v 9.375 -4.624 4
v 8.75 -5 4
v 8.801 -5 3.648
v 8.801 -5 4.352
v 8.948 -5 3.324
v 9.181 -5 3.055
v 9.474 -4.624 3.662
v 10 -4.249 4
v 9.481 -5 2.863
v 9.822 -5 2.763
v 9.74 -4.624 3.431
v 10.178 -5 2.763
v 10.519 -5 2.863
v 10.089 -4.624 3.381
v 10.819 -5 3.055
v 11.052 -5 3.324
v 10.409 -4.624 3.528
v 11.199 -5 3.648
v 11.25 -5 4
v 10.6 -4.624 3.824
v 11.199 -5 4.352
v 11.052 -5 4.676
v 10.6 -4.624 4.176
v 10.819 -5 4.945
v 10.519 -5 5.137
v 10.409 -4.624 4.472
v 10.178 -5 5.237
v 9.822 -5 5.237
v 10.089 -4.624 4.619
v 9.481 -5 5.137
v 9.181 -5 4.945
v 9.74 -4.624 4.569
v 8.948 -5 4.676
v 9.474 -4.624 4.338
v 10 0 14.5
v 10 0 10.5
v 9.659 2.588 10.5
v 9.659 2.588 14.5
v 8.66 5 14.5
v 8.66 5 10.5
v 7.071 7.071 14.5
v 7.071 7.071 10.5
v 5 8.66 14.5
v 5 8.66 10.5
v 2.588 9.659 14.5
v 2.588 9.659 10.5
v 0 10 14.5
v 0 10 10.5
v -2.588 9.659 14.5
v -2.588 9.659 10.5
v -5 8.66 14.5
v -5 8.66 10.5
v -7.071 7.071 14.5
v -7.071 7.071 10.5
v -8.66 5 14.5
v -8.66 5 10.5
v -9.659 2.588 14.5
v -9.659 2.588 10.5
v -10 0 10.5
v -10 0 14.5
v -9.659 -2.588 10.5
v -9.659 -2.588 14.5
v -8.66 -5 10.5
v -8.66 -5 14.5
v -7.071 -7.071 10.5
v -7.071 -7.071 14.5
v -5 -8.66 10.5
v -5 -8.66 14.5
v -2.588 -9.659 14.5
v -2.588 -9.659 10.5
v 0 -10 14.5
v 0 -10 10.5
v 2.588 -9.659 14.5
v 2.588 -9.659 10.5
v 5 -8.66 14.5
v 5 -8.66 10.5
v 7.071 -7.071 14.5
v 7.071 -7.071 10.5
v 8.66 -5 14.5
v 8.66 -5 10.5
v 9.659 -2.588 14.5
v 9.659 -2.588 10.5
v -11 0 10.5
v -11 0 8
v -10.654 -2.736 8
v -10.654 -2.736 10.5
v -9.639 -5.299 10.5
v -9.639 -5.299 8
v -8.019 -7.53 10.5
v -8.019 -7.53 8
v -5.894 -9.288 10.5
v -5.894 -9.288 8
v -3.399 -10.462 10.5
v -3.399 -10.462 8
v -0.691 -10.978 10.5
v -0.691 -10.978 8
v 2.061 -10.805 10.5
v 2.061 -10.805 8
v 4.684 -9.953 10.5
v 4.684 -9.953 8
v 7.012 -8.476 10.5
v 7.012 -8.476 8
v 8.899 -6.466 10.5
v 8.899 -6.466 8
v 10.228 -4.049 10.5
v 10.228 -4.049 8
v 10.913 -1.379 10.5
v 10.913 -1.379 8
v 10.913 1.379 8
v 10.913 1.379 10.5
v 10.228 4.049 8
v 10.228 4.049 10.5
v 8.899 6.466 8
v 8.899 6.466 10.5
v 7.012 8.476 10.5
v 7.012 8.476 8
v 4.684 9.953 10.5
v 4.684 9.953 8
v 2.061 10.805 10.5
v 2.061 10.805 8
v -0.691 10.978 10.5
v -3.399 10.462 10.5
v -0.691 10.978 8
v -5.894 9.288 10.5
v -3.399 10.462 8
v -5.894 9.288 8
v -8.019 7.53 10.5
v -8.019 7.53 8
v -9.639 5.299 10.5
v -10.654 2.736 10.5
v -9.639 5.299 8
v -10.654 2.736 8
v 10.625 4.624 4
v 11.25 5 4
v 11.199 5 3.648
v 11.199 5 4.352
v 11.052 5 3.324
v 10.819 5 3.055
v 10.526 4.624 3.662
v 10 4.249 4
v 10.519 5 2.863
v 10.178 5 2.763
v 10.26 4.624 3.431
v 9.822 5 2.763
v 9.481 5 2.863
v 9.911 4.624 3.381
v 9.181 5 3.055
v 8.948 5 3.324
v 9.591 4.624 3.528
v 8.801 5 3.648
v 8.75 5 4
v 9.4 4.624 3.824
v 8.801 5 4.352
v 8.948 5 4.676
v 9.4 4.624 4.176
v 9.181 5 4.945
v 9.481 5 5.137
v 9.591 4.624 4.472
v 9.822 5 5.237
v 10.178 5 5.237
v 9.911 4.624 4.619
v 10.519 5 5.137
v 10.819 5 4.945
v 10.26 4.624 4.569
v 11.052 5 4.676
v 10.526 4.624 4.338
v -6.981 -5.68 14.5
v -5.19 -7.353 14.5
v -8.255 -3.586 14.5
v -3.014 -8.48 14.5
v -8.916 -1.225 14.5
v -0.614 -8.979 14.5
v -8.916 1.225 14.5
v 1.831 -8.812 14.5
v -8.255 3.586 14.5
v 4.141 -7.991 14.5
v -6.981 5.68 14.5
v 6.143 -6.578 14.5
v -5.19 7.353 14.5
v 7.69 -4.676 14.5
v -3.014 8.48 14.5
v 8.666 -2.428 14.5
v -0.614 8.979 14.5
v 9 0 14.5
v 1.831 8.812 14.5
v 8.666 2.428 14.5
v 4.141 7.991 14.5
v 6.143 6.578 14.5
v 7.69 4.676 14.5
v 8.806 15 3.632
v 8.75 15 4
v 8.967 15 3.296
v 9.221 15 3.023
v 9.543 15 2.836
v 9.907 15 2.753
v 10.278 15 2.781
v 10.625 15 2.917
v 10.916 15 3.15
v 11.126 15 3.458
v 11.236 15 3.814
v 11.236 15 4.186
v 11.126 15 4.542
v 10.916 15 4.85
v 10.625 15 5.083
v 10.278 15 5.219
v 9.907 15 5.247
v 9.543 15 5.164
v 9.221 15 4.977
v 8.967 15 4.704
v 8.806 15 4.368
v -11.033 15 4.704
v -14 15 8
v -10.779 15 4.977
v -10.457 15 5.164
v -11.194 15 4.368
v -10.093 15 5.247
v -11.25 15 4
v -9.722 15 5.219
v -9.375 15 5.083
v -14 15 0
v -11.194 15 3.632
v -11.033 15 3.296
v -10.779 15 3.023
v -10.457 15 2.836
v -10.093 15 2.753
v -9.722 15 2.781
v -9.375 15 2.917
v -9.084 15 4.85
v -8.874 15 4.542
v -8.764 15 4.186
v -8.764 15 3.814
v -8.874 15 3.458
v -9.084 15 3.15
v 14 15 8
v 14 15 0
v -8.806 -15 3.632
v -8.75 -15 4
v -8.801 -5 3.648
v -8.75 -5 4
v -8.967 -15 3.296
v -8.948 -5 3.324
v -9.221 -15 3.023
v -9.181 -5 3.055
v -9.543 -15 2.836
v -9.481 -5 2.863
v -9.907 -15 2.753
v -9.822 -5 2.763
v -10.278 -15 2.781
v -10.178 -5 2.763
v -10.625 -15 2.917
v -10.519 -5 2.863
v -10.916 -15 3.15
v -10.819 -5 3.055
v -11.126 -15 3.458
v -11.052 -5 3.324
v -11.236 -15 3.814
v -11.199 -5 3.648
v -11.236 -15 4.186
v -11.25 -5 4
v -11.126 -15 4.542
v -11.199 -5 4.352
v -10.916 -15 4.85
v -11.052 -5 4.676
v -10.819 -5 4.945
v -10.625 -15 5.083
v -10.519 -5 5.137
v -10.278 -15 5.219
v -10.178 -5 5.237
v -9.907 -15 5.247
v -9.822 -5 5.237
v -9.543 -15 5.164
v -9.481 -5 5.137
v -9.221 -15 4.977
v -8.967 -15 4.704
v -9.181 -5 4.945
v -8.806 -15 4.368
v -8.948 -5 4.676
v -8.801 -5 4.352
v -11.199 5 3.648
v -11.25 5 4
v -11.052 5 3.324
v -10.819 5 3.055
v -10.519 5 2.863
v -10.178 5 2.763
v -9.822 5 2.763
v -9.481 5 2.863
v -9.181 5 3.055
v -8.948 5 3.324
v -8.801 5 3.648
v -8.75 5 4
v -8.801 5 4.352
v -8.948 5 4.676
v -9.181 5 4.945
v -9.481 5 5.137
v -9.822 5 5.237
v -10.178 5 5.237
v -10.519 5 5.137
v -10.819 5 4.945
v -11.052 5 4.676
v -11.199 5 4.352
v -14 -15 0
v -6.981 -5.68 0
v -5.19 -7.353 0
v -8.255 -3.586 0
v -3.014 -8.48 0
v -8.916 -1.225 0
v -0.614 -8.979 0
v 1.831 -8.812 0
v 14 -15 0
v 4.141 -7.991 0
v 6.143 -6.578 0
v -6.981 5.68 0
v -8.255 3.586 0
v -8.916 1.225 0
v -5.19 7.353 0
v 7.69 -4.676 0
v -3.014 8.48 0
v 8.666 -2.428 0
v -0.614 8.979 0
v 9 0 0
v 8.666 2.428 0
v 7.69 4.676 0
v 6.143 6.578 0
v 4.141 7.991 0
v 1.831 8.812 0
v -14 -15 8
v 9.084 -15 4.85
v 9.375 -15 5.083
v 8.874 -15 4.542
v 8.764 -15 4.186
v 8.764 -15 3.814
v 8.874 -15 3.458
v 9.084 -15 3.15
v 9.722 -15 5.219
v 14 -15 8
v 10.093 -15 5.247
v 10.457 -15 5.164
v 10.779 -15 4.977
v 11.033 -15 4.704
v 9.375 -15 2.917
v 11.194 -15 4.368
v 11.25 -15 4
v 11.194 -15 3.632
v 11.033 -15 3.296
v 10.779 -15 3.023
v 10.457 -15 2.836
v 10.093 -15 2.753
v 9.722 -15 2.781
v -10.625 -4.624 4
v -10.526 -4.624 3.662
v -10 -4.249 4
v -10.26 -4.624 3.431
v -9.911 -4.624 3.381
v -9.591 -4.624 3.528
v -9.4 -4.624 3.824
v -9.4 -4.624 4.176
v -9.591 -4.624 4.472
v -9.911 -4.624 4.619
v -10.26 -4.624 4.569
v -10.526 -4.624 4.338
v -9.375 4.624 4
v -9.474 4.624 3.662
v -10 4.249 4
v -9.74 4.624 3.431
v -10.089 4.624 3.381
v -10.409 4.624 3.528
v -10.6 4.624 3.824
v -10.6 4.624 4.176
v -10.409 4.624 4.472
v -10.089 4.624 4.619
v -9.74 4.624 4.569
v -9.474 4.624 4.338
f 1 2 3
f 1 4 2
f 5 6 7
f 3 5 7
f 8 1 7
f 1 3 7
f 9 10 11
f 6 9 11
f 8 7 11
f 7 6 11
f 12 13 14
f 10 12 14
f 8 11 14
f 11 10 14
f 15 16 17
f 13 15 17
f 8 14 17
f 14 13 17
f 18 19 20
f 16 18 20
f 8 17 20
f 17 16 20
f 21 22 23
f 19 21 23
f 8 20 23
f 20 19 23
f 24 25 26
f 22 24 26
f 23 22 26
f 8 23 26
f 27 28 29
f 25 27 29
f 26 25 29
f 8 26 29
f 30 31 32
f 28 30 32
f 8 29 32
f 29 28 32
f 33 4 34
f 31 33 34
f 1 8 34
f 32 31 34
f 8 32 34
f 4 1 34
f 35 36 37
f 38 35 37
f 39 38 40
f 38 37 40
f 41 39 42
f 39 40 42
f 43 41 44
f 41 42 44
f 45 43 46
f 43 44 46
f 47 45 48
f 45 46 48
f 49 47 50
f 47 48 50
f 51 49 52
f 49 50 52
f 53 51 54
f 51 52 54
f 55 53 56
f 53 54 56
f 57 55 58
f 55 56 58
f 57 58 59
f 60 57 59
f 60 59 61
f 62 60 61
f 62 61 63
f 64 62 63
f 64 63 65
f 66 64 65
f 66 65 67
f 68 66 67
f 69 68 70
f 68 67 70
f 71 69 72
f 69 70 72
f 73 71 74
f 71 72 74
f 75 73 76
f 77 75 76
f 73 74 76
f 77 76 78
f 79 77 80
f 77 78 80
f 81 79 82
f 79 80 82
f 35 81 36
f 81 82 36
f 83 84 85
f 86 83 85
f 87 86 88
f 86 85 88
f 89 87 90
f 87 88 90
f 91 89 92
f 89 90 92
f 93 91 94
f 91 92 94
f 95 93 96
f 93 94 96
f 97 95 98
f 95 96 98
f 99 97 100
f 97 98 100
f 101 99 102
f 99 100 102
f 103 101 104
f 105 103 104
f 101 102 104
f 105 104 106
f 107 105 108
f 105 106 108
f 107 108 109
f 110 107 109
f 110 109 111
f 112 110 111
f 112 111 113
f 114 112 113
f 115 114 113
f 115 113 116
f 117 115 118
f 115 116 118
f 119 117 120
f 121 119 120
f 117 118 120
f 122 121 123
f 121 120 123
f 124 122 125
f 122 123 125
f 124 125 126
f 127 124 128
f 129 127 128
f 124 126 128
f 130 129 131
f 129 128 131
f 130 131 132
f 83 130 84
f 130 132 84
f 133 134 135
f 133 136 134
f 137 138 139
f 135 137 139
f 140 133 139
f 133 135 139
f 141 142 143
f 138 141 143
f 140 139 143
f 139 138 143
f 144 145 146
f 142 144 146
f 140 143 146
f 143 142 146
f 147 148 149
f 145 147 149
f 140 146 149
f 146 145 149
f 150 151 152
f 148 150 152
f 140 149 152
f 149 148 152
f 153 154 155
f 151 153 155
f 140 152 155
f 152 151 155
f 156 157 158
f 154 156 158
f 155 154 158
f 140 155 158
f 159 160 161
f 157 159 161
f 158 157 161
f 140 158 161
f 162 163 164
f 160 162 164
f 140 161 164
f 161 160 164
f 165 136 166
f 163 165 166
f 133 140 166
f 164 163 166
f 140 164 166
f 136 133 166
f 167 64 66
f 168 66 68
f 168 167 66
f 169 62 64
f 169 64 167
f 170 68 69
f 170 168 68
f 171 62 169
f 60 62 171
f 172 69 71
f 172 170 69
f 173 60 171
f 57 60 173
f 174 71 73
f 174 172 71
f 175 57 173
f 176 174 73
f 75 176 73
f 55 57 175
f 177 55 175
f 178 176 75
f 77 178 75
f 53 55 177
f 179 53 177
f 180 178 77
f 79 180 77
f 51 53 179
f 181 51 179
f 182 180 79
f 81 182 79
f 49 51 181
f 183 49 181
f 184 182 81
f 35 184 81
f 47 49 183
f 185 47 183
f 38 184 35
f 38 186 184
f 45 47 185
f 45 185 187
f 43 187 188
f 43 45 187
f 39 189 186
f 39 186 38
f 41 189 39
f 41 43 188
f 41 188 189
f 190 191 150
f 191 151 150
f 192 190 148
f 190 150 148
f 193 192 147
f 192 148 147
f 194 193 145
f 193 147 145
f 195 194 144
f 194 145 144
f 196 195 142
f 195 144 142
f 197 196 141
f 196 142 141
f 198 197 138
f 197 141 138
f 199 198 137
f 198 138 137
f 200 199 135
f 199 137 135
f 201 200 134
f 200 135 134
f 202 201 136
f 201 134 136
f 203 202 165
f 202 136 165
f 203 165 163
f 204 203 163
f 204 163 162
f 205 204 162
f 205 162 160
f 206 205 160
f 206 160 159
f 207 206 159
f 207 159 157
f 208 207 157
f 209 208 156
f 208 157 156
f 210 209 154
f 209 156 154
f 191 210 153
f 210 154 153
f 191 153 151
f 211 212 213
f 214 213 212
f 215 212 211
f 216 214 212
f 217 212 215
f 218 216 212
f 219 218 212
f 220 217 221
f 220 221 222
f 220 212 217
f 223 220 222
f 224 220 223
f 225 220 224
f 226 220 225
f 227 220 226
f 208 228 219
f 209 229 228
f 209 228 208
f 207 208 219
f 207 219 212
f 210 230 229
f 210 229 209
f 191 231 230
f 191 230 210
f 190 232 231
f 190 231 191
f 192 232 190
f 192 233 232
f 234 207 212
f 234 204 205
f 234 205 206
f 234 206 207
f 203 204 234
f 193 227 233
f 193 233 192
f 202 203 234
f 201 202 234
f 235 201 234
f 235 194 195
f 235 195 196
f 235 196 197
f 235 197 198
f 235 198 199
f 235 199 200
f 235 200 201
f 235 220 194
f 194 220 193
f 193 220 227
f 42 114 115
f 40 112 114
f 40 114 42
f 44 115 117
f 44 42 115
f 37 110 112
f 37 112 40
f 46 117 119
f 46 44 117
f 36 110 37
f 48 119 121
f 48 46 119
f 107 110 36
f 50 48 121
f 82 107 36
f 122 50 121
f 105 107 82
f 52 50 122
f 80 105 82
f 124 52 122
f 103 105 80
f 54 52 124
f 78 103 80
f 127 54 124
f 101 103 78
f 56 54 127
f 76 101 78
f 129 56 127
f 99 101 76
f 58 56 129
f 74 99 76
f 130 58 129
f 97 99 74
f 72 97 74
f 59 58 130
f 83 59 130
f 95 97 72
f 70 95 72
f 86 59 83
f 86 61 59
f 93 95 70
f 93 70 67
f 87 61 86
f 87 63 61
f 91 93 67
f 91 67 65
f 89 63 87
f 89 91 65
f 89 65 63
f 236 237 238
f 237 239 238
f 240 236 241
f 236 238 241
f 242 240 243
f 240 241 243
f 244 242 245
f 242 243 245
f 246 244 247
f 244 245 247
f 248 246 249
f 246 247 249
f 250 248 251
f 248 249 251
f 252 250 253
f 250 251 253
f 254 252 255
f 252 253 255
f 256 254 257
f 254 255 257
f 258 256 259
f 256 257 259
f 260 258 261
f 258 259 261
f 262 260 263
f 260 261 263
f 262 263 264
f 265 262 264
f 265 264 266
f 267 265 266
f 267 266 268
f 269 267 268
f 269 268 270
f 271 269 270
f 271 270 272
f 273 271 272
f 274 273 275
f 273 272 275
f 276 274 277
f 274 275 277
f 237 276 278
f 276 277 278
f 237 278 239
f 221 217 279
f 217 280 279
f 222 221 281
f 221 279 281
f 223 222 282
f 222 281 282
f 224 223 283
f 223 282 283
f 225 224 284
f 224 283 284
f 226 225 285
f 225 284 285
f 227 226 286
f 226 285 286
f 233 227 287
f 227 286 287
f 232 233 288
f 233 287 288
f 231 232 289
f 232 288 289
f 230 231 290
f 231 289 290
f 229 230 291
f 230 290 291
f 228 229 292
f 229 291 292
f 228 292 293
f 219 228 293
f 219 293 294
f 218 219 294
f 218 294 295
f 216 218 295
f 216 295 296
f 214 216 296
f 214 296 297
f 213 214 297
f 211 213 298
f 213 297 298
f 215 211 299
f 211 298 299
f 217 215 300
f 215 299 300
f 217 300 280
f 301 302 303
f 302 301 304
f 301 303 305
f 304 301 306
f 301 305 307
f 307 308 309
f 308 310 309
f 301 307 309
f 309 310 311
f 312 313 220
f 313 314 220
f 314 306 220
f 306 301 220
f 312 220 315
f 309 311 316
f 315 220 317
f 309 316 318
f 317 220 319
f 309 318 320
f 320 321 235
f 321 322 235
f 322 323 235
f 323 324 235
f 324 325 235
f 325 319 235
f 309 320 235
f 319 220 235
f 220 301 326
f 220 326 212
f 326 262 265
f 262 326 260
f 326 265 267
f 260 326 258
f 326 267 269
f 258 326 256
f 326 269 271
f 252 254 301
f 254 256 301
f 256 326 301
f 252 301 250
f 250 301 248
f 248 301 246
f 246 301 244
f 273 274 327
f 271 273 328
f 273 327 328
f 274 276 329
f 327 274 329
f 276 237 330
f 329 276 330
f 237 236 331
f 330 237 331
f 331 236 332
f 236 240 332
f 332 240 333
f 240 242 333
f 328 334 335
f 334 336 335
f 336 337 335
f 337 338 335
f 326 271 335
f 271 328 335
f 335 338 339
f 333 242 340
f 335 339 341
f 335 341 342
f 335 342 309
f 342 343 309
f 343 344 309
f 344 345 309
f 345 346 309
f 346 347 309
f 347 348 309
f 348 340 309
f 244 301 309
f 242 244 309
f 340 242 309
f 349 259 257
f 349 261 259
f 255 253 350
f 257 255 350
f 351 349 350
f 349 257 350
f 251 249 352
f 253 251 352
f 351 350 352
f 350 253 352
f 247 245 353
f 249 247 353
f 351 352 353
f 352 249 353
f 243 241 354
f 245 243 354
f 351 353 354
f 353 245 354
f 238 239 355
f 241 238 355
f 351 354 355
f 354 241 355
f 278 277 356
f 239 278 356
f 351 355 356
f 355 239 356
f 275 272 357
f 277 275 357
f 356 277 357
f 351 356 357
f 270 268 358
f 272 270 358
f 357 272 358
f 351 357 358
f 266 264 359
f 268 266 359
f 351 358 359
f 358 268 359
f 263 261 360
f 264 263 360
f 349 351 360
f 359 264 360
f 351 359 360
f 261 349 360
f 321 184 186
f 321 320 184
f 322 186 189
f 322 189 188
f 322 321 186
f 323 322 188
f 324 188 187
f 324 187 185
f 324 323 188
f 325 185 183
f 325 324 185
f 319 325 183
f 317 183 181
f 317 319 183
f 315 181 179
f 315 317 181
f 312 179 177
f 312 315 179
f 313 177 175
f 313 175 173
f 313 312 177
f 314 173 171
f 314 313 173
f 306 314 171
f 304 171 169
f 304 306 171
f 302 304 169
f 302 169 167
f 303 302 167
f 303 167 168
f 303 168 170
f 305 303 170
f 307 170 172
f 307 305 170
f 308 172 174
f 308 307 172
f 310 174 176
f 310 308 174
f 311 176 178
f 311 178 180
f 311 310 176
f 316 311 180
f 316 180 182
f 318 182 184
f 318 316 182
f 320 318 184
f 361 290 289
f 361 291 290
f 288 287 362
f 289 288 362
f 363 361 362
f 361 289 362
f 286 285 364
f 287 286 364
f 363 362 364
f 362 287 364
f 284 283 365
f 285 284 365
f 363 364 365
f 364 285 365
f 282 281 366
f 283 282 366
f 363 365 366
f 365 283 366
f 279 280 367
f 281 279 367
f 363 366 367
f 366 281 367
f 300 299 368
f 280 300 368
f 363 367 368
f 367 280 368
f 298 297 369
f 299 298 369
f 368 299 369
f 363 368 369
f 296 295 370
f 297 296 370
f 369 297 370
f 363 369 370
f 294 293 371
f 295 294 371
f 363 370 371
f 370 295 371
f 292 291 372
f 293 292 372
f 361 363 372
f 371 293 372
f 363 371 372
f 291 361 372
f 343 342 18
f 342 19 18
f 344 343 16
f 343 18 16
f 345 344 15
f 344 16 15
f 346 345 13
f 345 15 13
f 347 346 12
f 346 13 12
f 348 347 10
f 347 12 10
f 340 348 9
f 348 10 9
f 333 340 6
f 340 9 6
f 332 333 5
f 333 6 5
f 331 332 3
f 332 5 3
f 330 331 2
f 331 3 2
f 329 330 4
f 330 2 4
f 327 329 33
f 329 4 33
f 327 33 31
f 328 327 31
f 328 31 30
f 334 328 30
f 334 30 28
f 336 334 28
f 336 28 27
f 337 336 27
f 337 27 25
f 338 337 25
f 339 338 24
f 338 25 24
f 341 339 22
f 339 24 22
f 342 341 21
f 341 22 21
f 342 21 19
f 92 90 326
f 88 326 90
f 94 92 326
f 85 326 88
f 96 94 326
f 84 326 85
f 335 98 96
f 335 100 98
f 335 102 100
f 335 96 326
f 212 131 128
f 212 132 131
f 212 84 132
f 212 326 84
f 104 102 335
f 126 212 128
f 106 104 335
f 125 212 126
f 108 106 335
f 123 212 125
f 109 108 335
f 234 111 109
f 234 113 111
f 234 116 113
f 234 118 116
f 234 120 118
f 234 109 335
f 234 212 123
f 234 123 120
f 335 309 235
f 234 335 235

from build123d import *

# Parameters (mm, degrees)
SKETCH_1_W             = 28
SKETCH_1_H             = 30
SKETCH_1_R             = 9
EXTRUDE_1_DEPTH        = 8
SKETCH_2_R             = 11
SKETCH_2_R_2           = 9
EXTRUDE_2_DEPTH        = 2.5
SKETCH_3_R             = 10
SKETCH_3_R_2           = 9
EXTRUDE_3_DEPTH        = 4
HOLE_WIZARD_M3_1_D     = 2.5
HOLE_WIZARD_M3_1_DEPTH = 10
HOLE_WIZARD_M3_1_TIP   = 0.751075774
HOLE_WIZARD_M3_2_D     = 2.5
HOLE_WIZARD_M3_2_DEPTH = 10
HOLE_WIZARD_M3_2_TIP   = 0.751075774


with BuildPart() as part:
    # 草图1 → 凸台-拉伸1 (new body)
    with BuildSketch(Plane.XY):
        Rectangle(SKETCH_1_W, SKETCH_1_H)
        Circle(SKETCH_1_R, mode=Mode.SUBTRACT)
    extrude(amount=EXTRUDE_1_DEPTH)

    # 草图2 → 凸台-拉伸2 (add)
    with BuildSketch(Plane.XY.offset(8)):
        with Locations(Location((0, 0, 0), (0, 0, 180))):
            Circle(SKETCH_2_R)
        Circle(SKETCH_2_R_2, mode=Mode.SUBTRACT)
    extrude(amount=EXTRUDE_2_DEPTH)

    # 草图3 → 凸台-拉伸3 (add)
    with BuildSketch(Plane.XY.offset(10.5)):
        Circle(SKETCH_3_R)
        Circle(SKETCH_3_R_2, mode=Mode.SUBTRACT)
    extrude(amount=EXTRUDE_3_DEPTH)

    # M3 螺纹孔1
    with Locations(Plane(origin=(0, 15, 0), x_dir=(1, 0, 0), z_dir=(0, 1, 0))):
        with Locations((-10, -4), (10, -4)):
            Hole(HOLE_WIZARD_M3_1_D / 2, depth=HOLE_WIZARD_M3_1_DEPTH)
            with Locations((0, 0, -(HOLE_WIZARD_M3_1_DEPTH + HOLE_WIZARD_M3_1_TIP / 2))):  # 118° drill point
                Cone(0, HOLE_WIZARD_M3_1_D / 2, HOLE_WIZARD_M3_1_TIP, mode=Mode.SUBTRACT)

    # M3 螺纹孔2
    with Locations(Plane(origin=(0, -15, 0), x_dir=(-1, 0, 0), z_dir=(0, -1, 0))):
        with Locations((-10, -4), (10, -4)):
            Hole(HOLE_WIZARD_M3_2_D / 2, depth=HOLE_WIZARD_M3_2_DEPTH)
            with Locations((0, 0, -(HOLE_WIZARD_M3_2_DEPTH + HOLE_WIZARD_M3_2_TIP / 2))):  # 118° drill point
                Cone(0, HOLE_WIZARD_M3_2_D / 2, HOLE_WIZARD_M3_2_TIP, mode=Mode.SUBTRACT)


solid = part.part
